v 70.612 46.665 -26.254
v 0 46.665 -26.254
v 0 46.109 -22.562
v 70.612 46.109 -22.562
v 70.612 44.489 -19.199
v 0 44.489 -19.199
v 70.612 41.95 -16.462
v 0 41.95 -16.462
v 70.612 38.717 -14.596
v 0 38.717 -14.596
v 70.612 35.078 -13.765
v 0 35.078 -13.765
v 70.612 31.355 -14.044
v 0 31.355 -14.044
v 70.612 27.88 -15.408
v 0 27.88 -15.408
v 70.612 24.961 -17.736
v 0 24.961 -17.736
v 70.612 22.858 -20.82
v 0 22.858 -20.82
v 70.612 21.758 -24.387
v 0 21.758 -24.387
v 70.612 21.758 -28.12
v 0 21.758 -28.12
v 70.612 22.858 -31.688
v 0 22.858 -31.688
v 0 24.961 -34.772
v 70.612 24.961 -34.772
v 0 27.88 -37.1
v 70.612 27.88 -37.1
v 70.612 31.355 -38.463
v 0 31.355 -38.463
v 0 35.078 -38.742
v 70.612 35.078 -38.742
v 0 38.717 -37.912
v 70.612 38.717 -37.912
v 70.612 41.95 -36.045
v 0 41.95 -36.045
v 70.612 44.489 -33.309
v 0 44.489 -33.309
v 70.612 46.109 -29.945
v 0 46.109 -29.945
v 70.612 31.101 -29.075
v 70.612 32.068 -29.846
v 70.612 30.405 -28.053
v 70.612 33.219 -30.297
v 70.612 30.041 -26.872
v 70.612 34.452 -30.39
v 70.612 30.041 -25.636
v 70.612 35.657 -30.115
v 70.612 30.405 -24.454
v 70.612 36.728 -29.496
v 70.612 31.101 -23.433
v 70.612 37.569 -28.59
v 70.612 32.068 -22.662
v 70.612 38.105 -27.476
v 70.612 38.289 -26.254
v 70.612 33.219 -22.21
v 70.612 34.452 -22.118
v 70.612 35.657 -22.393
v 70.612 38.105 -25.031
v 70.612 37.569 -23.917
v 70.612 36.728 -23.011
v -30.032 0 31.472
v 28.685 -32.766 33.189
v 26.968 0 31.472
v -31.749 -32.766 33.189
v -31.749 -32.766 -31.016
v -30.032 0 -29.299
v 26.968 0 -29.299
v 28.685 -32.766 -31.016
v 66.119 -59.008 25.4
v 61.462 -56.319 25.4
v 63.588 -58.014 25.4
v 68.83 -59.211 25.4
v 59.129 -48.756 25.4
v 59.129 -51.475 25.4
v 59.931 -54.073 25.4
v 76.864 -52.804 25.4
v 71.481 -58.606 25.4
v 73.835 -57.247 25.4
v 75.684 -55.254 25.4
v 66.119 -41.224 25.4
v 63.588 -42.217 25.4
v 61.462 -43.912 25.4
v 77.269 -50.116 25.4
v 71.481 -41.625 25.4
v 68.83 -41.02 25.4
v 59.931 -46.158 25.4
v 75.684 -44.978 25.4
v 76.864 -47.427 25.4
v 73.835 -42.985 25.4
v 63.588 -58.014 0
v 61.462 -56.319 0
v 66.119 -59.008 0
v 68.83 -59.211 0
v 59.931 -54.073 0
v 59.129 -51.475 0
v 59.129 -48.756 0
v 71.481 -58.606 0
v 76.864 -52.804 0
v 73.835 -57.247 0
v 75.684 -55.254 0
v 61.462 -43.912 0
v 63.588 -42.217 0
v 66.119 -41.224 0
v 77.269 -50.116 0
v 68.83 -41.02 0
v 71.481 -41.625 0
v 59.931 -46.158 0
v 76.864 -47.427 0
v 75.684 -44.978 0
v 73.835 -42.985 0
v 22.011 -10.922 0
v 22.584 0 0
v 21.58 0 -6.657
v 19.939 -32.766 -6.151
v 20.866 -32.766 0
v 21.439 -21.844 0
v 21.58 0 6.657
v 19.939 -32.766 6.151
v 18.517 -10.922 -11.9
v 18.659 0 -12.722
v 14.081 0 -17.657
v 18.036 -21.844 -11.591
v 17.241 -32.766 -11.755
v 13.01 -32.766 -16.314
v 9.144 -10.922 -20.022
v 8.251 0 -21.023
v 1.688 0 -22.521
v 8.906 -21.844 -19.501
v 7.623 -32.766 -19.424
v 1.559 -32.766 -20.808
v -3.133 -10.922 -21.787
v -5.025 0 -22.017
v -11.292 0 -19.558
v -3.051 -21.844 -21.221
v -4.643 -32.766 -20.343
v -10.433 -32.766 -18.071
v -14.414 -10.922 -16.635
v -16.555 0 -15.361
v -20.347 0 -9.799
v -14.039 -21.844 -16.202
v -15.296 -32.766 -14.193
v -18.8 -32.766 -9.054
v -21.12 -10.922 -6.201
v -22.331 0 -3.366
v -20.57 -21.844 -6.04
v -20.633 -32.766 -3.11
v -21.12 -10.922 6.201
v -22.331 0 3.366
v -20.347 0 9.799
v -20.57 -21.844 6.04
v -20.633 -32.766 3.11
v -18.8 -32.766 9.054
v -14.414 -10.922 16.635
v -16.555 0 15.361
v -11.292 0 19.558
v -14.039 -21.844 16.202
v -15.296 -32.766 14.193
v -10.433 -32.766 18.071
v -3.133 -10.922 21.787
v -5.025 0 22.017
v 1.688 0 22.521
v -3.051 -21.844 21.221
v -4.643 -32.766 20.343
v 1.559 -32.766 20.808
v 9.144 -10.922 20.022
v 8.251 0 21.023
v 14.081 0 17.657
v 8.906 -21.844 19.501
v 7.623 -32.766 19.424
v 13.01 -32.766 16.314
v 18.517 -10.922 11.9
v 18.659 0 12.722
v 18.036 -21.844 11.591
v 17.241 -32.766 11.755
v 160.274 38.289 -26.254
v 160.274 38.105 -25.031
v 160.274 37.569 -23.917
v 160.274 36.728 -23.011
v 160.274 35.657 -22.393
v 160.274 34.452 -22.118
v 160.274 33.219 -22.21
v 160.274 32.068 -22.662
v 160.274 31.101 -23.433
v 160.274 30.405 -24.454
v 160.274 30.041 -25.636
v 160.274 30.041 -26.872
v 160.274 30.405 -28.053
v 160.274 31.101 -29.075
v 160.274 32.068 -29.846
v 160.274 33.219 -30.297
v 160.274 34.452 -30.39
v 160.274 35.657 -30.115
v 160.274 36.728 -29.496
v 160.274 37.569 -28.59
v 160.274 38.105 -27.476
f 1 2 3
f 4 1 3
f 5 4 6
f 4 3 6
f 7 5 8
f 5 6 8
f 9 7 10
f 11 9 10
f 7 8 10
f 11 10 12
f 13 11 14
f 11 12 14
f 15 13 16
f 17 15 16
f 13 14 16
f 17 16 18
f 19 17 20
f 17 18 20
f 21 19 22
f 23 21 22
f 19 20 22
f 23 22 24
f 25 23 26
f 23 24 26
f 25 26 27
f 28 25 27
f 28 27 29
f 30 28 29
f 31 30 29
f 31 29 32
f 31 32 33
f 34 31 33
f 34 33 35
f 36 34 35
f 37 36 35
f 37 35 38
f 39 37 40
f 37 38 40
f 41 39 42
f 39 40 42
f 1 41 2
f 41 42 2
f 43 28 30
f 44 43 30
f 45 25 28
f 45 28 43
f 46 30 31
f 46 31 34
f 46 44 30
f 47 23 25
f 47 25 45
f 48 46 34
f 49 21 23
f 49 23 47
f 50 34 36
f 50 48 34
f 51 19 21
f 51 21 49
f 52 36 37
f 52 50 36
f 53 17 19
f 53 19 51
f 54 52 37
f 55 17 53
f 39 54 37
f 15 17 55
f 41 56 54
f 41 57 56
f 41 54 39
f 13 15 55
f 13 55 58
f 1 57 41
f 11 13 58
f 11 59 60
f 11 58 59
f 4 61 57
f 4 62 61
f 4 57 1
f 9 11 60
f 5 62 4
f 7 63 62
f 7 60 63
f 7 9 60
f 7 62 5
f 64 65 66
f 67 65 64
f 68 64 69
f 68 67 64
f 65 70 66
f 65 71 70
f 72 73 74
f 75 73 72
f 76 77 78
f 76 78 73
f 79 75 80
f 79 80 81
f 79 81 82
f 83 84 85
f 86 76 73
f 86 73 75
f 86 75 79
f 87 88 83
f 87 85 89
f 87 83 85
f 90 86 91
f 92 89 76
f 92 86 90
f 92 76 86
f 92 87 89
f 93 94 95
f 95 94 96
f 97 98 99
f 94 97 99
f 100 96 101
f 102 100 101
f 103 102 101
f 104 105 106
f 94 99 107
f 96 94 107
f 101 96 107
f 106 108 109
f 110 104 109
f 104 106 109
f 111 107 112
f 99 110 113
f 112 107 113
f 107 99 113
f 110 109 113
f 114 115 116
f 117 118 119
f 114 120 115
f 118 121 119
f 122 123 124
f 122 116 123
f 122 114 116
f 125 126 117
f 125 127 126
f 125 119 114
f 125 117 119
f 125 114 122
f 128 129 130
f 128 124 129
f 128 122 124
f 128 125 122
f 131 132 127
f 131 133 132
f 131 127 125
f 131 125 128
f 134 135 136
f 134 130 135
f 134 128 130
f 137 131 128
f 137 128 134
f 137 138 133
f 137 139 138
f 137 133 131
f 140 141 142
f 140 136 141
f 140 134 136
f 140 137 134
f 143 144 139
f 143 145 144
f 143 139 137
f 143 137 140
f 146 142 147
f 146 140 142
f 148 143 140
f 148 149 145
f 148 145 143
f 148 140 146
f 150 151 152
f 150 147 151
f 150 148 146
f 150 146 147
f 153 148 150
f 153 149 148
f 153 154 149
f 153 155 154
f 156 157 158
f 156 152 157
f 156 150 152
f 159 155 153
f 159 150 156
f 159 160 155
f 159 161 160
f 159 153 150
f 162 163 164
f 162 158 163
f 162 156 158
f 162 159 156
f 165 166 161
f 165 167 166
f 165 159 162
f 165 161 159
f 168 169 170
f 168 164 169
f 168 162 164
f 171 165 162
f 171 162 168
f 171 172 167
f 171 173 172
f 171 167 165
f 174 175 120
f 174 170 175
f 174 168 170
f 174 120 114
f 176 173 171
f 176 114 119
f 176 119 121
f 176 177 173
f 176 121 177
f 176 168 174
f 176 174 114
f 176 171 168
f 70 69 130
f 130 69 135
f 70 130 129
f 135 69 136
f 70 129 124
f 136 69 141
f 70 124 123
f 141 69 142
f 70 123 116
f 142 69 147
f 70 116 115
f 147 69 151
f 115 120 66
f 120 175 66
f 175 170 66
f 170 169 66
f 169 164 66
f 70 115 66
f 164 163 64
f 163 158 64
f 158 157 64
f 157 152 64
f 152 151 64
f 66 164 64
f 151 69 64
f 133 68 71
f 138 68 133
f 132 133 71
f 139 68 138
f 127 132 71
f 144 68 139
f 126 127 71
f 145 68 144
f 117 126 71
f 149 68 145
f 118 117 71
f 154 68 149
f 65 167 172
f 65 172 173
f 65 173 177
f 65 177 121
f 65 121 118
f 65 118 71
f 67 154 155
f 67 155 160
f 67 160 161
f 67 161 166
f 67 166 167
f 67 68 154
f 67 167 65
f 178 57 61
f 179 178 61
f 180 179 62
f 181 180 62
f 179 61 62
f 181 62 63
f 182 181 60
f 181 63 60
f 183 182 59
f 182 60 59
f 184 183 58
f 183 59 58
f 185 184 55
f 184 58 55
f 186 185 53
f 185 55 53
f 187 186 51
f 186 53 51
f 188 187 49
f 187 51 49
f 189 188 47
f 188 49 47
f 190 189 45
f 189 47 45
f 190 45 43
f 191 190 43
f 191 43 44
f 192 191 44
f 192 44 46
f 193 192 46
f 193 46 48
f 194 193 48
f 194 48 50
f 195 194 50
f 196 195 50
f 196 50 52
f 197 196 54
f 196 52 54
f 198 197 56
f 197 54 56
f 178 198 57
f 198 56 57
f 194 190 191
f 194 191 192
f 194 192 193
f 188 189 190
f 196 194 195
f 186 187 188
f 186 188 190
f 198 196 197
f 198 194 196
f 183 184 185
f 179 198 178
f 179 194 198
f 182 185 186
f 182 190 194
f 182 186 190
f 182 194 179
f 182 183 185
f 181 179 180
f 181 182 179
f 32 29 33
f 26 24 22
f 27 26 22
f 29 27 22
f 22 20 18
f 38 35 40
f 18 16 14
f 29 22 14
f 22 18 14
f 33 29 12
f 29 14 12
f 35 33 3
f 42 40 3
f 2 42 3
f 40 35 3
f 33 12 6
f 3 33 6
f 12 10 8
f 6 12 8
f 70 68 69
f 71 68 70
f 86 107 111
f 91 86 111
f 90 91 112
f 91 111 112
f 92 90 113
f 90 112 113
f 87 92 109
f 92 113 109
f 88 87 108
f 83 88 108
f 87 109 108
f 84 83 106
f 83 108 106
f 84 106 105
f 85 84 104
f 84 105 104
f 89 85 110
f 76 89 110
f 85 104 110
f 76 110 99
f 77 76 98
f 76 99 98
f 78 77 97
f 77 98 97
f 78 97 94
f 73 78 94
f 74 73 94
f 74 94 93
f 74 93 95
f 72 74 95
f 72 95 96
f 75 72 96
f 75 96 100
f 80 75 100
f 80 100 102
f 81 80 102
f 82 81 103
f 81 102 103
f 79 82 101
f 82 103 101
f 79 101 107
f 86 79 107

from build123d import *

# Parameters (mm, degrees)
F0_W     = 56.9996088743
F0_H     = 60.7708934695
F0_R     = 22.583664069
F1_DEPTH = 32.766
F1_TAPER = -3
F2_R     = 9.1207647164
F3_DEPTH = 25.4
F4_R     = 12.5236196166
F5_DEPTH = 70.612
F6_R     = 4.147507251
F7_DEPTH = 89.662


with BuildPart() as f1:
    # F0 (on Front) → F1 (new body)
    with BuildSketch(Plane.XZ):
        with Locations((-1.53224729, 1.086439006)):
            Rectangle(F0_W, F0_H)
        Circle(F0_R, mode=Mode.SUBTRACT)
    extrude(amount=F1_DEPTH, taper=F1_TAPER)


with BuildPart() as f3:
    # F2 (on Top) → F3 (new body)
    with BuildSketch(Plane.XY):
        with Locations((68.1483224034, -50.1156412065)):
            Circle(F2_R)
    extrude(amount=F3_DEPTH)


with BuildPart() as f5:
    # F4 (on Right) → F5 (new body)
    with BuildSketch(Plane.YZ):
        with Locations((34.1417044401, -26.2538418174)):
            Circle(F4_R)
    extrude(amount=F5_DEPTH)

    # F6 (on face) → F7 (join)
    with BuildSketch(Plane.YZ.offset(70.612)):
        with Locations((34.1417044401, -26.2538418174)):
            Circle(F6_R)
    extrude(amount=F7_DEPTH)


solid = Compound([f1.part, f3.part, f5.part])
